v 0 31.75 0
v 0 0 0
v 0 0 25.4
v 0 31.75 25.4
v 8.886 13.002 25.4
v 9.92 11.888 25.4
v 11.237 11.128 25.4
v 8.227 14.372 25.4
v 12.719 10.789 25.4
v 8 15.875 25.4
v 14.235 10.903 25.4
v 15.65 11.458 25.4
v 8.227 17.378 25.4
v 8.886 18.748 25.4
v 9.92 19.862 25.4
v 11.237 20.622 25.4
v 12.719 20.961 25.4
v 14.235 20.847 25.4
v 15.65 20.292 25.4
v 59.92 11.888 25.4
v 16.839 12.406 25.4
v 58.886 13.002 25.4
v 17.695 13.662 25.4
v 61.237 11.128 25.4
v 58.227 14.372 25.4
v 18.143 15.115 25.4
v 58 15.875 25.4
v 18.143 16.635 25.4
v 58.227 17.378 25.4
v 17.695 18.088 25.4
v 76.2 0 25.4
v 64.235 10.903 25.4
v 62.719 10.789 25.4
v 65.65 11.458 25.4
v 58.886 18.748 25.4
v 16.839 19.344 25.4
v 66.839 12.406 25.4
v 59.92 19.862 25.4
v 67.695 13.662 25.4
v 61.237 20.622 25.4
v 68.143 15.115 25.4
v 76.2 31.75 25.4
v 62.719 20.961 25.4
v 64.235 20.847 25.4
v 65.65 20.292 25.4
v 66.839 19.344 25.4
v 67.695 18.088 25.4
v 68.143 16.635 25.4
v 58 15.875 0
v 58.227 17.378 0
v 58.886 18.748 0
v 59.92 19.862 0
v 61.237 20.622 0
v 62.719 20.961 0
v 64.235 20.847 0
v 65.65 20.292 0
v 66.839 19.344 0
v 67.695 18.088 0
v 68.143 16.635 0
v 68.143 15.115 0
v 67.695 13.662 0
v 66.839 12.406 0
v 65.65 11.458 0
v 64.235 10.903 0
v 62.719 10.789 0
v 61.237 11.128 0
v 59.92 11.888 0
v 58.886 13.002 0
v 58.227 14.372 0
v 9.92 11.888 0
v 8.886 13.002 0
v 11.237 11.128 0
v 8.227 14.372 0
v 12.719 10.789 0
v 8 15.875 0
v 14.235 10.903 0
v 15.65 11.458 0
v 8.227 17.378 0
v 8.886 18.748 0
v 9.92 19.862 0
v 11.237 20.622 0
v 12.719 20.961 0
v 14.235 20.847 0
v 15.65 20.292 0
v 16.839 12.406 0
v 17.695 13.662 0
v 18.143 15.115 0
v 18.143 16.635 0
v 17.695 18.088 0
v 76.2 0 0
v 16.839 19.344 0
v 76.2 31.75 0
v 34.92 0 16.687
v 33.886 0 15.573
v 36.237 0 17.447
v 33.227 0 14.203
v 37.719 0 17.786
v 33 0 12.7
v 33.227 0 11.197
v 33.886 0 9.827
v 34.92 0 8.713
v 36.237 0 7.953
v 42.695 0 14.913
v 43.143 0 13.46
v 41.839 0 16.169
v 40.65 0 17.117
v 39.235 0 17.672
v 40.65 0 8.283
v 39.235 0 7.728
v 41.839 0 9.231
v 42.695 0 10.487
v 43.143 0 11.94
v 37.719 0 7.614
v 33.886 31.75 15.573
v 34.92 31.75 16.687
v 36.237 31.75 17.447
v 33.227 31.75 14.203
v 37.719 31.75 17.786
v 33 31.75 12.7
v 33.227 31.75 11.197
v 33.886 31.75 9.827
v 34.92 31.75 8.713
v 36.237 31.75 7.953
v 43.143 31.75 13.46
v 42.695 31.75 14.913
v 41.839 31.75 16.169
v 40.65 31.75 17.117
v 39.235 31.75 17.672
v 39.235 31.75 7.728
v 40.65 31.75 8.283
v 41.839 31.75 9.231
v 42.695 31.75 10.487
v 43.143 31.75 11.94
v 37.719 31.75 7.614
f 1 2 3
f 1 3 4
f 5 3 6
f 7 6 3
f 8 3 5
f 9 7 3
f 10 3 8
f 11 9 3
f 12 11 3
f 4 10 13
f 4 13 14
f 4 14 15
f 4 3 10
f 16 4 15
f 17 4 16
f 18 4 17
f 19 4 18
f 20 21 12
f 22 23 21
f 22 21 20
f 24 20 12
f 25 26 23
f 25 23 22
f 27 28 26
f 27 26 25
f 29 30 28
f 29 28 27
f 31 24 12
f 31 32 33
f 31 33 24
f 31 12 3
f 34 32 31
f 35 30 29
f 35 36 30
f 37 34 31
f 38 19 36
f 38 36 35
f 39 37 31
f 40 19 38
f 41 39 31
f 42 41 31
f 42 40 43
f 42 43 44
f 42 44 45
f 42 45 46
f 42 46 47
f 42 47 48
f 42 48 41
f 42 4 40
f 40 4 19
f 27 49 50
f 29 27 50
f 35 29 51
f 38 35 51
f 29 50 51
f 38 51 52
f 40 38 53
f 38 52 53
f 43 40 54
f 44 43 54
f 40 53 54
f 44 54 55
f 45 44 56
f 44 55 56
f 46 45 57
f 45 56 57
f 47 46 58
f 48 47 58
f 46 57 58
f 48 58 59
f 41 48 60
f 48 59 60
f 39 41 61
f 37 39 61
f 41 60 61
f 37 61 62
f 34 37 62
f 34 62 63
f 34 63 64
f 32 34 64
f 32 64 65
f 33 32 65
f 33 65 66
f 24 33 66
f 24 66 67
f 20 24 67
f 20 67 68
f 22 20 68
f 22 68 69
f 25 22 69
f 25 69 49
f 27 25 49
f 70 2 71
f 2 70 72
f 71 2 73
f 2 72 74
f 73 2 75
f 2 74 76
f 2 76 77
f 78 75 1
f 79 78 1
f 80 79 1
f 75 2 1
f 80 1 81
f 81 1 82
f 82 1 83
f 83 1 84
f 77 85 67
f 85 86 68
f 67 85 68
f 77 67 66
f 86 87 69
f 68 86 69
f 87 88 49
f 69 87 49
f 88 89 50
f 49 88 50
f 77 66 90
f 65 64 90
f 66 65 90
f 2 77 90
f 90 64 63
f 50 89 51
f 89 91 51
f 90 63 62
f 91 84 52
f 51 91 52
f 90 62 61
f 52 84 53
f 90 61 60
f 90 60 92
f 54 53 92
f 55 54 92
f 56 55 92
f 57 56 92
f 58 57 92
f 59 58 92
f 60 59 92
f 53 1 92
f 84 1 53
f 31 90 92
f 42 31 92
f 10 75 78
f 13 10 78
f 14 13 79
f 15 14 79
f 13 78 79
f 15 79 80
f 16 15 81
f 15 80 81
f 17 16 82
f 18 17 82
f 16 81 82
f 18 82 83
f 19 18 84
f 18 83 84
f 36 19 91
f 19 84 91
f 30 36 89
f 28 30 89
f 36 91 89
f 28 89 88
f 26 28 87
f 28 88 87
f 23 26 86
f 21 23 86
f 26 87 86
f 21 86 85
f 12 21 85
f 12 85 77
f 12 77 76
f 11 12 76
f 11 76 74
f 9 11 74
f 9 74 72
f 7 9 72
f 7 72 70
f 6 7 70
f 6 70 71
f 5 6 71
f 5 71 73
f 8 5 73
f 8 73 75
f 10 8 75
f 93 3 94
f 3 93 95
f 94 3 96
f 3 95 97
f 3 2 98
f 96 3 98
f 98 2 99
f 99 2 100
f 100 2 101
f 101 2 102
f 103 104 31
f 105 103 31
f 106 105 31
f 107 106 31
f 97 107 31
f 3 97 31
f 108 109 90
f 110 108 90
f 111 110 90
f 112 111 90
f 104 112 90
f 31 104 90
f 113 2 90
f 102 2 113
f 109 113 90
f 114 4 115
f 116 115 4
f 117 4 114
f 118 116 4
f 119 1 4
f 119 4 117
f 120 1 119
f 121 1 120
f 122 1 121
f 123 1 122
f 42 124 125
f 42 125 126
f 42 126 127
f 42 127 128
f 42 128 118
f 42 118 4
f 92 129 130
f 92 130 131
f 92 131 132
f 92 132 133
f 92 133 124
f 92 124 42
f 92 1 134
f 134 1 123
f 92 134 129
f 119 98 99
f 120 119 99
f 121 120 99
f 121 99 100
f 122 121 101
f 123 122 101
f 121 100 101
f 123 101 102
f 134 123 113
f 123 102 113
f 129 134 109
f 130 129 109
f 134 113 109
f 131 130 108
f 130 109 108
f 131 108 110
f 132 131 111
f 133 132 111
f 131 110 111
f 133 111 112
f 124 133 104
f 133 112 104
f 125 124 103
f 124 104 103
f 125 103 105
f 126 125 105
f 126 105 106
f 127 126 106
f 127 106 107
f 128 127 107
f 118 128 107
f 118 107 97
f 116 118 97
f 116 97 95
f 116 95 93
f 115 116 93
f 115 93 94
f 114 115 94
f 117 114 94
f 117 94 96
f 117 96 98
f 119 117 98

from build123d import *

# Parameters (mm, degrees)
SKETCH1_W           = 76.2
SKETCH1_H           = 31.75
BOSS_EXTRUDE1_DEPTH = 25.4
M12_TAPPED_HOLE2_D  = 10.2
M12_TAPPED_HOLE1_D  = 10.2


with BuildPart() as part:
    # Sketch1 → Boss-Extrude1 (new body)
    with BuildSketch(Plane.XY):
        with Locations((38.1, 15.875)):
            Rectangle(SKETCH1_W, SKETCH1_H)
    extrude(amount=BOSS_EXTRUDE1_DEPTH)

    # M12 Tapped Hole2 (through all)
    with Locations(Plane.XY.offset(25.4)):
        with Locations((13.1, 15.875), (63.1, 15.875)):
            Hole(M12_TAPPED_HOLE2_D / 2)

    # M12 Tapped Hole1 (through all)
    with Locations(Plane(origin=(0, 31.75, 0), x_dir=(1, 0, 0), z_dir=(0, 1, 0))):
        with Locations((38.1, -12.7)):
            Hole(M12_TAPPED_HOLE1_D / 2)


solid = part.part
